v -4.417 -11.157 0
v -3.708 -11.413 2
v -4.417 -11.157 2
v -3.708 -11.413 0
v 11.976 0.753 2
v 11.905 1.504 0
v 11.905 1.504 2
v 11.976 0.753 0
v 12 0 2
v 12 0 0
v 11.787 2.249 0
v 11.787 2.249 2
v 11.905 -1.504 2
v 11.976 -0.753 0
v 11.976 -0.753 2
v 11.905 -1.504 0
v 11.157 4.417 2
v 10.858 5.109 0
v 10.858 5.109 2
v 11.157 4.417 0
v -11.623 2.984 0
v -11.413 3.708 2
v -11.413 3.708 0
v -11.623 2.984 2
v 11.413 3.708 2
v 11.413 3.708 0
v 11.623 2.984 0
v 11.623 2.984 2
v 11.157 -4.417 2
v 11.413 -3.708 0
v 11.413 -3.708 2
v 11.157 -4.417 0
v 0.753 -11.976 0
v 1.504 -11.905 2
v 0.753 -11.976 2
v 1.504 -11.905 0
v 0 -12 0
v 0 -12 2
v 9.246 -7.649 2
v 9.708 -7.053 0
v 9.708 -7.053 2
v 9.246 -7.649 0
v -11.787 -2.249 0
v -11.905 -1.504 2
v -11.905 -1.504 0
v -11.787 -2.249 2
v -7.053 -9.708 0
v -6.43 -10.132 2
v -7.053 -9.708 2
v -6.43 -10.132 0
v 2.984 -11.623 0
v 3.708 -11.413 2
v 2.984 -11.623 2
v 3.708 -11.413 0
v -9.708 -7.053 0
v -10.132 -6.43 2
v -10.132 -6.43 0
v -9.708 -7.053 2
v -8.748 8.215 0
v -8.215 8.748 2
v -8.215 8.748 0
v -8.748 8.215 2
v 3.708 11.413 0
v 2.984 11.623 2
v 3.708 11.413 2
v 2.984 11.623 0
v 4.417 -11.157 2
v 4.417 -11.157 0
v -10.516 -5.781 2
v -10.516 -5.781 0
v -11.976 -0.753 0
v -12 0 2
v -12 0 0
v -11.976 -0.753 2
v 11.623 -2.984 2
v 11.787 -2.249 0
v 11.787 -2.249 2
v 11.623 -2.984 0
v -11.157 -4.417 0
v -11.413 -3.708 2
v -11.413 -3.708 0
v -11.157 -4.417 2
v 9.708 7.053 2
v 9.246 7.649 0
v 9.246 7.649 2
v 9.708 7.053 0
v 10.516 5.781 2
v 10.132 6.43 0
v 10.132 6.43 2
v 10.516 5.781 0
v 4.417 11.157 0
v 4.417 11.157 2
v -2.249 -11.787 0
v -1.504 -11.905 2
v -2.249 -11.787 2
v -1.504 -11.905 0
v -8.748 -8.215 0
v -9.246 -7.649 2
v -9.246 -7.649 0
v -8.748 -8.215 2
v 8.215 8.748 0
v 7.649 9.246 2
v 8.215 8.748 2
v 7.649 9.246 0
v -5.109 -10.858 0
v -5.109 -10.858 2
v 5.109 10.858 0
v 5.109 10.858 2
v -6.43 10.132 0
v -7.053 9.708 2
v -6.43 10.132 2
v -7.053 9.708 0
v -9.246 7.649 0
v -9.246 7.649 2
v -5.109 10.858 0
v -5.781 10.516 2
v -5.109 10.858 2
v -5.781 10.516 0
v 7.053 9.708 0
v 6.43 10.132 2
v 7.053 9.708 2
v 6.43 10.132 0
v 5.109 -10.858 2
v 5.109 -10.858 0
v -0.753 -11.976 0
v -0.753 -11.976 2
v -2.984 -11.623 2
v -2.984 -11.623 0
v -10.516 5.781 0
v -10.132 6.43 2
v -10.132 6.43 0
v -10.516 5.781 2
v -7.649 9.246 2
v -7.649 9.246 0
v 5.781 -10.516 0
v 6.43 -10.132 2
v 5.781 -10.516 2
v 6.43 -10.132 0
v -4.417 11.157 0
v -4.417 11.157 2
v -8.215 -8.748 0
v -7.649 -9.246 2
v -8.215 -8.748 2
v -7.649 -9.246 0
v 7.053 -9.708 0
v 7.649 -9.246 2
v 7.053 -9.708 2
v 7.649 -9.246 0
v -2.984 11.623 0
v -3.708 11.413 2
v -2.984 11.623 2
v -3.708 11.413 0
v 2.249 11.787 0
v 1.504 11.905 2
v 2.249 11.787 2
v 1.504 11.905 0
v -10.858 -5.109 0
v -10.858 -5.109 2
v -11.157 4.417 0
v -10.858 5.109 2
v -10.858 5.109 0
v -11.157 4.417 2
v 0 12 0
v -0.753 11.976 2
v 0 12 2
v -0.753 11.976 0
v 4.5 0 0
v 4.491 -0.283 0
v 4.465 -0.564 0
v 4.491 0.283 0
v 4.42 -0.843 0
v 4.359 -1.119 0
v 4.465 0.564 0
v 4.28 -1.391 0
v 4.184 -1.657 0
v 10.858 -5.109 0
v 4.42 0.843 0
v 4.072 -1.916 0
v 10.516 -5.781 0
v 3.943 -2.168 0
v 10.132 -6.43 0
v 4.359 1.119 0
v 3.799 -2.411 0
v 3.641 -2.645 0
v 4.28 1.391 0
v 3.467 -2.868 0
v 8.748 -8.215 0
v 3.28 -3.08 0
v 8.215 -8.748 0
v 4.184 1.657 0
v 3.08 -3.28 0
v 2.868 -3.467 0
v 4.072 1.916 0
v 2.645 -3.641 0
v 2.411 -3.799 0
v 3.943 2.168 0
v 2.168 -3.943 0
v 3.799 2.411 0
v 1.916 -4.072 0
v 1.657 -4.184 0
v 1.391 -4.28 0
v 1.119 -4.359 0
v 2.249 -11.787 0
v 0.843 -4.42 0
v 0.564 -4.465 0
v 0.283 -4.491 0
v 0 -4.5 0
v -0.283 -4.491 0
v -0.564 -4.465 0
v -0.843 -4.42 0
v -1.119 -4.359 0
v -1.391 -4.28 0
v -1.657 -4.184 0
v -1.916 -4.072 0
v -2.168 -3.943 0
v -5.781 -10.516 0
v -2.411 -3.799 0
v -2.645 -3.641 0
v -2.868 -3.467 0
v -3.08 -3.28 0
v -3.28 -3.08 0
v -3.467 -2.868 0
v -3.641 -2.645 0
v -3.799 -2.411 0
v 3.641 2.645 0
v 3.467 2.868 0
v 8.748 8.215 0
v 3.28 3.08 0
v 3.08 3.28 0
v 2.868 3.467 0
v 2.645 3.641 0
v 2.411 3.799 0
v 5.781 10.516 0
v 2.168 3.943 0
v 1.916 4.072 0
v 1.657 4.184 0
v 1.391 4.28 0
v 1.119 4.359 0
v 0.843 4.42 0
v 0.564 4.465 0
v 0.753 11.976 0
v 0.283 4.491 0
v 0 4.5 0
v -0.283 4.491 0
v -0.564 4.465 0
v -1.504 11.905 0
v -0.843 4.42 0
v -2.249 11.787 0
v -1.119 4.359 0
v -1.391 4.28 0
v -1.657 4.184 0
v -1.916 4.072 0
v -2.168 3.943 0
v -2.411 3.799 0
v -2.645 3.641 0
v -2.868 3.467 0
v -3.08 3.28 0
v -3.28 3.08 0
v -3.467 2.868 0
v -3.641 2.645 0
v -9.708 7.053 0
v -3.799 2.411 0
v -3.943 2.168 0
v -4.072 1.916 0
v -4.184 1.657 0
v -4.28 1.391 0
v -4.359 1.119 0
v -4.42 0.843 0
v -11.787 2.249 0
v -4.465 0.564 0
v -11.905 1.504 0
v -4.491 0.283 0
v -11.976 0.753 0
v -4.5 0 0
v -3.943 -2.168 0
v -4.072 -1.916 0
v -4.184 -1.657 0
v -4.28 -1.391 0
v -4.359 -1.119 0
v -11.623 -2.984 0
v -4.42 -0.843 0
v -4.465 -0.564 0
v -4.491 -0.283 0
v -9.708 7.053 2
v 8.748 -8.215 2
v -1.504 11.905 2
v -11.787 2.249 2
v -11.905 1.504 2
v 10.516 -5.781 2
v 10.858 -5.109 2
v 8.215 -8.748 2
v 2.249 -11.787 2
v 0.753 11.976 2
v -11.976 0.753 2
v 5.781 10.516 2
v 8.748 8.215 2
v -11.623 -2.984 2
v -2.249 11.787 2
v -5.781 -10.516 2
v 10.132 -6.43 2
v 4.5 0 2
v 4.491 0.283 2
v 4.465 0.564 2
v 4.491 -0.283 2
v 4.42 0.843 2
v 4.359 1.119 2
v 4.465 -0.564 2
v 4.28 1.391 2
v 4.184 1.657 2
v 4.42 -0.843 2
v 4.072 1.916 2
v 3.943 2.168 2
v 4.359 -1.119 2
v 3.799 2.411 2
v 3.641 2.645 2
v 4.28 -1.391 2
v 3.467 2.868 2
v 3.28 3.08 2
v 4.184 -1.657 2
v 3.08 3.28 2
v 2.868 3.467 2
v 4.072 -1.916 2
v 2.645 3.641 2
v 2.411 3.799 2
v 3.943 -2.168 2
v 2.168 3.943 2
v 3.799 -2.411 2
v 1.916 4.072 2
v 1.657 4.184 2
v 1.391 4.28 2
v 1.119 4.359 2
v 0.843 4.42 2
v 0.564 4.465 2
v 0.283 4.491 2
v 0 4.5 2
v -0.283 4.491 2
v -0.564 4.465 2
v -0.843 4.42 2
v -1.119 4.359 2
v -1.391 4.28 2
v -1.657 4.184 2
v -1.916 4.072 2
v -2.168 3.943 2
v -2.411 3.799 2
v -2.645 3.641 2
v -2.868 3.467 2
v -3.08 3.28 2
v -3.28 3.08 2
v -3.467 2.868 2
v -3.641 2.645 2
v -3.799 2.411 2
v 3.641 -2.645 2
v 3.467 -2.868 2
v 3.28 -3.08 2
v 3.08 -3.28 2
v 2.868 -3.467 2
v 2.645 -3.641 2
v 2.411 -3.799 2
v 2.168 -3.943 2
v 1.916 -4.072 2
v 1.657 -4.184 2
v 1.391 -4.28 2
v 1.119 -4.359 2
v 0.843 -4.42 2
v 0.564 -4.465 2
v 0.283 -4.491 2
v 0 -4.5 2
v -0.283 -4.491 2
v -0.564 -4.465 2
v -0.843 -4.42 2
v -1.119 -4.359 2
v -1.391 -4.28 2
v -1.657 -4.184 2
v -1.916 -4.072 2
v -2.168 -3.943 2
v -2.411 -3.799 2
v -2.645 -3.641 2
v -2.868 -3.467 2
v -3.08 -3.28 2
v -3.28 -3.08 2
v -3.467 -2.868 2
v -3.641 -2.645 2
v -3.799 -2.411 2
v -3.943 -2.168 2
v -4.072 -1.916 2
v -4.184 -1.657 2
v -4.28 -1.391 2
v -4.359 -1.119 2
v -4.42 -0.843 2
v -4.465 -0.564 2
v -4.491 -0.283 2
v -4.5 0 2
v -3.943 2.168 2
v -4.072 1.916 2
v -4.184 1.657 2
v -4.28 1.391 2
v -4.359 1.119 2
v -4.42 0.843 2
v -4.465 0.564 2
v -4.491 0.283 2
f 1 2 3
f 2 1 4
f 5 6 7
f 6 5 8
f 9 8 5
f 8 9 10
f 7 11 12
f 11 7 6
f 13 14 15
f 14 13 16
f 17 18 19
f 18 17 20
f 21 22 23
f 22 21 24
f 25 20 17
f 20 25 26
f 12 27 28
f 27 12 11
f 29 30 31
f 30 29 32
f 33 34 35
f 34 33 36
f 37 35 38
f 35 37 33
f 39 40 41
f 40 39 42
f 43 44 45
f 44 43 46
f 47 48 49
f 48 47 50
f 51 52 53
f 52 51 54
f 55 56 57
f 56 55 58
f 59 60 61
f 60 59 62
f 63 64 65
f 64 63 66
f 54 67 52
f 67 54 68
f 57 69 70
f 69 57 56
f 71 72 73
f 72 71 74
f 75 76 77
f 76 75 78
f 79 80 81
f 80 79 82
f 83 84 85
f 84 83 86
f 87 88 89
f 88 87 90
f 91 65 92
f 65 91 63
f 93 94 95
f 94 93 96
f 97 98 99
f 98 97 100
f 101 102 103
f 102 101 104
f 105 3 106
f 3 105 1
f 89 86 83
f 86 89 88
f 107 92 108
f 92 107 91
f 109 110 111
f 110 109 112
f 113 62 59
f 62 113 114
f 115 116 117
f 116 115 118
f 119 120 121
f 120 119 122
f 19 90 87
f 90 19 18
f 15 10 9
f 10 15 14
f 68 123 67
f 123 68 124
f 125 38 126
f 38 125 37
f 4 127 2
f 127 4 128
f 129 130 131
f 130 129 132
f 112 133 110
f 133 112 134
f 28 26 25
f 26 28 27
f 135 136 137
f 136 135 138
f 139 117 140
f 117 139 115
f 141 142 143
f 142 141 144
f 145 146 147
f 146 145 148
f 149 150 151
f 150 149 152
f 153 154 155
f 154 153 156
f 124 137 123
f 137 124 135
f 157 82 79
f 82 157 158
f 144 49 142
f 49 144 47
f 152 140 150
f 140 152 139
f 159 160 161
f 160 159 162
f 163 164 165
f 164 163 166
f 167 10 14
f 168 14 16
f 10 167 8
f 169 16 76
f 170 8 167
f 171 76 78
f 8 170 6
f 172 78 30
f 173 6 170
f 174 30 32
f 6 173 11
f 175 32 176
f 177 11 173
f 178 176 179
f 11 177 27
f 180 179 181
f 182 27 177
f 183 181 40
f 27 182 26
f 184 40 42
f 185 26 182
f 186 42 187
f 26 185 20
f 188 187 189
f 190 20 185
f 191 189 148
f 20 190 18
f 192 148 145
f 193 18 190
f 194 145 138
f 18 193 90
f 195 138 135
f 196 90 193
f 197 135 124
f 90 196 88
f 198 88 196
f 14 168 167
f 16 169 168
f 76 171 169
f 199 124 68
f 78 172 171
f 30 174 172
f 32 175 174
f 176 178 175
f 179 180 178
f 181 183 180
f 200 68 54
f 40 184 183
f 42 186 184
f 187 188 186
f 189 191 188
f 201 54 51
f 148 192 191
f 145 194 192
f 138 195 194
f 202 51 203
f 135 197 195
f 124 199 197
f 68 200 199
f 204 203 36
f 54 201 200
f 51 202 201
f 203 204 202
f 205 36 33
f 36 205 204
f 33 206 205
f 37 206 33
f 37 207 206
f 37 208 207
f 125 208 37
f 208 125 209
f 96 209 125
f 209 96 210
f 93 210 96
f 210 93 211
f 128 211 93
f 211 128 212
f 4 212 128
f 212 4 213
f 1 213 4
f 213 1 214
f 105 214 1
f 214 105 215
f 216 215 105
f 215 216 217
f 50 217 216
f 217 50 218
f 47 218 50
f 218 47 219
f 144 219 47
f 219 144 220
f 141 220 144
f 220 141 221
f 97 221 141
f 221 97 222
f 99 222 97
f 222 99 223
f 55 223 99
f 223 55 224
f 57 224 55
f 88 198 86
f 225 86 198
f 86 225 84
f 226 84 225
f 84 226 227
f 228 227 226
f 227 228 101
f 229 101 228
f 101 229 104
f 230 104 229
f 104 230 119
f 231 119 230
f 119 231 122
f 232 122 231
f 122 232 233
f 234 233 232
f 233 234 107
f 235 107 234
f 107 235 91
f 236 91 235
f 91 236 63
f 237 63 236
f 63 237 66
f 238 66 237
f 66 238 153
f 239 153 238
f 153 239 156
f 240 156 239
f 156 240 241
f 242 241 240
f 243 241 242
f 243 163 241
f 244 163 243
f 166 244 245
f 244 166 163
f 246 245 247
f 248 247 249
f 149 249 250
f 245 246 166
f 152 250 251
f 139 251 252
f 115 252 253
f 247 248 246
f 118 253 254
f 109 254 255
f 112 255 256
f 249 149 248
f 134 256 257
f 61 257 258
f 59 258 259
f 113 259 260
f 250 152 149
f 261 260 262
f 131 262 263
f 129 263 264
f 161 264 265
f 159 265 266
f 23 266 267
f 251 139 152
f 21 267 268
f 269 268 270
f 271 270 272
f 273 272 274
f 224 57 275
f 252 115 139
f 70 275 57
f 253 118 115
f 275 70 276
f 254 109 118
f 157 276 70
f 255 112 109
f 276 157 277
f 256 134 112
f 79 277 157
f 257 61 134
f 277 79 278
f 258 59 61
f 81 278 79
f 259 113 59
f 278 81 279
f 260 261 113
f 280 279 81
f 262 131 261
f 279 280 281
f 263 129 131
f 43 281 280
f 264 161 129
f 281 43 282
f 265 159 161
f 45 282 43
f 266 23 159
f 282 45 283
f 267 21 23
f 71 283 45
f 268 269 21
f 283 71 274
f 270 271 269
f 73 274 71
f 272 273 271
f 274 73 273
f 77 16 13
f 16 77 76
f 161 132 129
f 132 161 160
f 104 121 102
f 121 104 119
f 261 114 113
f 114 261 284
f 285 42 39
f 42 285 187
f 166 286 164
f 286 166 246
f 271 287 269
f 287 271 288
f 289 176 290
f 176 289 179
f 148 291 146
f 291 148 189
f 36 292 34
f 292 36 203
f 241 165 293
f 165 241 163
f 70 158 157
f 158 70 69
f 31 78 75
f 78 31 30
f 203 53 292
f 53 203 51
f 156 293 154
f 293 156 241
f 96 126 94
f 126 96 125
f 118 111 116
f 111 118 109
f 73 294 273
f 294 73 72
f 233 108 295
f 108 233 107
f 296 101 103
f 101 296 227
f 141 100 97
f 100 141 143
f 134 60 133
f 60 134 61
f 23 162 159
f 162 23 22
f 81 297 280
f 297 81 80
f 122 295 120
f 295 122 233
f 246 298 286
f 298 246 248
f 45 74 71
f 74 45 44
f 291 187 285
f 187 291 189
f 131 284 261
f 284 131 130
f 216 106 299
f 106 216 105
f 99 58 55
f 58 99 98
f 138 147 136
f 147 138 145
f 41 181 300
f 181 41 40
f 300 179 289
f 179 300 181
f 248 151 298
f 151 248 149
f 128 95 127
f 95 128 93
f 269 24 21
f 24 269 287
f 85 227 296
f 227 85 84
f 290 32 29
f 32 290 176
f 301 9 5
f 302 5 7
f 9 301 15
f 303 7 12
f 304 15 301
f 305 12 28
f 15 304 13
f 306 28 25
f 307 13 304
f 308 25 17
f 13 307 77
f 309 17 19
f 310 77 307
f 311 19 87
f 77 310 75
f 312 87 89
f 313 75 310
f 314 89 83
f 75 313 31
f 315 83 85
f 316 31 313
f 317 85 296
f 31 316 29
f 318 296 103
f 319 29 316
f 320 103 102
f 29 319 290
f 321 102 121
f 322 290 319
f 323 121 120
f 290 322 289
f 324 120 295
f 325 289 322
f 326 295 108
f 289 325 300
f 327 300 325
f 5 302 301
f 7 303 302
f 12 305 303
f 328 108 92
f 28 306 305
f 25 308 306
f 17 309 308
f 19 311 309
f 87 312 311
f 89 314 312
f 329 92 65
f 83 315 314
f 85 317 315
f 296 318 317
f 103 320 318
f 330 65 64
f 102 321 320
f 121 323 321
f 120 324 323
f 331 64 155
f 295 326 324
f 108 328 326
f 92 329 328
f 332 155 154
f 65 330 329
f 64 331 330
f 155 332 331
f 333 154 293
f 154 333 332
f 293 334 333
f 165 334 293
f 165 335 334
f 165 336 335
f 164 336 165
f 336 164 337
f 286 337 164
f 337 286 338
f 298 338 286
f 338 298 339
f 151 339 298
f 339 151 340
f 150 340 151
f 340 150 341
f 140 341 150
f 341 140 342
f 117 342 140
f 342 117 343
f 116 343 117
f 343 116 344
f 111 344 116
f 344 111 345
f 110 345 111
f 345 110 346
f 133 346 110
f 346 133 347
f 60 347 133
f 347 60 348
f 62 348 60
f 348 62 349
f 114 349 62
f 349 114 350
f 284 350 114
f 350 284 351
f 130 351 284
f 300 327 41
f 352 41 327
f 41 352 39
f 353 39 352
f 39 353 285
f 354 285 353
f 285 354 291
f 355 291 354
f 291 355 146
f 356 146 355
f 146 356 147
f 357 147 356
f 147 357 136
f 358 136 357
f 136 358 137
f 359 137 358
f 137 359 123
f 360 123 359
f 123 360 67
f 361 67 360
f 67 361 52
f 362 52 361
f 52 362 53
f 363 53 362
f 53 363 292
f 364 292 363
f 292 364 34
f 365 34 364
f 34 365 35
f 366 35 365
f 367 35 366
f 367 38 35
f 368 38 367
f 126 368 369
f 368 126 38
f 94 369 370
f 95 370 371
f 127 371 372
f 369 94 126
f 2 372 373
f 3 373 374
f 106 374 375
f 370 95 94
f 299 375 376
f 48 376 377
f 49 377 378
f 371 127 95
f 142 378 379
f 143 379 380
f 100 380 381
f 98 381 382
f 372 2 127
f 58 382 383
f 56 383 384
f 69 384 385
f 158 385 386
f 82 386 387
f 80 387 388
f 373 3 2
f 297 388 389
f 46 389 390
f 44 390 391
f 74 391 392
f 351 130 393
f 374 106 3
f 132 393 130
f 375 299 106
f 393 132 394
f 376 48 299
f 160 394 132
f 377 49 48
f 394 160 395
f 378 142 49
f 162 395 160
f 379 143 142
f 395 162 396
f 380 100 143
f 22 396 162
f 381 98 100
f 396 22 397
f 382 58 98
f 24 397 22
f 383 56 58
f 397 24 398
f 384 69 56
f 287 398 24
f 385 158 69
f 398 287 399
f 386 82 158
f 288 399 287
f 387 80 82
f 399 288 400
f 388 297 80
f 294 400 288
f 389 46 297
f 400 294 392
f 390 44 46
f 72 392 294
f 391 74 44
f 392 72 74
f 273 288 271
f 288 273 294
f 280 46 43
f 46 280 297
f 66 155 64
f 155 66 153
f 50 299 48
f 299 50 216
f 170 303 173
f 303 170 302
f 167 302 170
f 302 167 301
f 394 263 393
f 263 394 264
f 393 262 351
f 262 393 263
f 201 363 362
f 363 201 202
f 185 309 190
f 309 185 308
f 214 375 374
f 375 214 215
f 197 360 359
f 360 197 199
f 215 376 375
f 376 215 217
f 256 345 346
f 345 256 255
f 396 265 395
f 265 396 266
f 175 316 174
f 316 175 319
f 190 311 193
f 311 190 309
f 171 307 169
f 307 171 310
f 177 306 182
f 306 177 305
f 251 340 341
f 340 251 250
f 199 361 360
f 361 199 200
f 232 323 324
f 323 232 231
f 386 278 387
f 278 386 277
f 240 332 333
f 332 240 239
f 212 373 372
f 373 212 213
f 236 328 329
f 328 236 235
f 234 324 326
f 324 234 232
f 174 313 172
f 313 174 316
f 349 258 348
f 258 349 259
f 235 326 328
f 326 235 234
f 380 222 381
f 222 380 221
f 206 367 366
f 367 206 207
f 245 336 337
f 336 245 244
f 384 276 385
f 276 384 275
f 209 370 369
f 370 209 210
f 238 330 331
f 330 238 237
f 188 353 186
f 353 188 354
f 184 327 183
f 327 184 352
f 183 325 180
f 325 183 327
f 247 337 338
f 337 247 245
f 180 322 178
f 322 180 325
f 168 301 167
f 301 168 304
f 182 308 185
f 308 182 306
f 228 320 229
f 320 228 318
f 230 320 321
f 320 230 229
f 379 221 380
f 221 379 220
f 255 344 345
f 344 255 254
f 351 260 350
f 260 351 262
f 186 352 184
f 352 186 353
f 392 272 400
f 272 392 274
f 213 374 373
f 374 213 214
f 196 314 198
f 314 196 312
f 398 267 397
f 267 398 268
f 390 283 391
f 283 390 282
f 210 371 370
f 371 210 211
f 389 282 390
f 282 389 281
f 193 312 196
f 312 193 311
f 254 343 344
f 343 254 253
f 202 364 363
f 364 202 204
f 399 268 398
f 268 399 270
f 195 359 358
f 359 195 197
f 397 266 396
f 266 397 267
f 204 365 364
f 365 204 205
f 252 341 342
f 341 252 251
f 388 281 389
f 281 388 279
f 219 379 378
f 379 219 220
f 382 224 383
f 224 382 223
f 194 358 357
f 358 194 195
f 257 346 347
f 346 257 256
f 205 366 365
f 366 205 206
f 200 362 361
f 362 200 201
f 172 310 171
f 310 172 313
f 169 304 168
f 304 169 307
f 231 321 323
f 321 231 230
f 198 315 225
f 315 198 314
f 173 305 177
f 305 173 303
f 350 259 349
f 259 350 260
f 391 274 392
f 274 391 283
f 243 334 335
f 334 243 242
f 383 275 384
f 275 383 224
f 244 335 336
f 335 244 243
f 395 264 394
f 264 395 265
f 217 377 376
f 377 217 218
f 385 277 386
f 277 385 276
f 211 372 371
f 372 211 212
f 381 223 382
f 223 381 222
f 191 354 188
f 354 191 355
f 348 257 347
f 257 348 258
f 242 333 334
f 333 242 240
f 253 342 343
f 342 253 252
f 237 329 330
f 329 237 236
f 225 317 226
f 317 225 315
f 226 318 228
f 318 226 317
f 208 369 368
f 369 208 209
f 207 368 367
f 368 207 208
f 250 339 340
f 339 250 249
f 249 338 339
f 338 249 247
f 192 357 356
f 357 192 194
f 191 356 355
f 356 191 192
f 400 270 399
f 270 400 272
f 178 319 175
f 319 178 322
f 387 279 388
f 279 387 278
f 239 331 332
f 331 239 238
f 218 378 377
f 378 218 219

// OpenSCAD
/* 'Nut Job' nut, bolt, washer and threaded rod factory by Mike Thompson 1/12/2013, Thingiverse: mike_linus
 *
 * Licensing: This work is licensed under a Creative Commons Attribution-NonCommercial-ShareAlike 3.0 Australia License.
 * Further information is available here - http://creativecommons.org/licenses/by-nc-sa/3.0/au/deed.en_GB
 *
 * v2 8/12/2013 - added socket head types
 * v3 2/11/2014 - adjusted wing nut algorithm for better behaviour with unusual nut sizes and added ISO262 metric references
 * v4 31/12/2014 - added optional texture to socket heads, added ability to change the number of facets for a hex head
 * and adjusted wingnut base level on certain nut sizes
 * v5 11/1/2015 - added phillips and slot drive types and improved texture handling 
 * v6 21/2/2015 - added wing ratio to wingnuts 
 * v7 6/3/2016 - added extended options to control number of facets on nuts, square sockets (or any number of facets) and socket depth control
 * v8 1/1/2017 - modified library code to remove dependence on deprecated 'assign' statement
 * 
 * This script generates nuts, bolts, washers and threaded rod using the library 
 * script: polyScrewThead.scad (modified/updated version polyScrewThread_r1.scad)
 * http://www.thingiverse.com/thing:8796, CC Public Domain
 *
 * Defaults are for a 8mm diameter bolts, rod, matching nuts and wing nuts that work well together
 * without cleanup or modification. Some default parameters such as the nut outer diameter are deliberately
 * altered to produce a snug fit that can still be hand tightened. This may need to be altered
 * depending on individual printer variances, slicing tools, filament etc. Suggest printing a matching
 * bolt and nut and adjusting as necessary.  Note: slow print speeds, low temperatures and solid
 * fill are recommended for best results.
 */

/* [Component Type] */

type						    = "washer";//[nut,bolt,rod,washer]

/* [Bolt and Rod Options] */

//Head type - Hex, Socket Cap, Button Socket Cap or Countersunk Socket Cap (ignored for Rod)
head_type              			= "hex";//[hex,socket,button,countersunk]
//Drive type - Socket, Phillips, Slot (ignored for Hex head type and Rod)
drive_type              		= "socket";//[socket,phillips,slot]
//Distance between flats for the hex head or diameter for socket or button head (ignored for Rod)
head_diameter    				= 20;	
//Height of the head (ignored for Rod)
head_height  					= 8;	
//Diameter of drive type (ignored for Hex head and Rod)
drive_diameter					= 5;	
//Width of slot aperture for phillips or slot drive types
slot_width					    = 1;
//Depth of slot aperture for slot drive type
slot_depth 					    = 5;
//Surface texture (socket head only)
texture                         = "exclude";//[include,exclude]
//Outer diameter of the thread
thread_outer_diameter           = 8;		
//Thread step or Pitch (2mm works well for most applications ref. ISO262: M3=0.5,M4=0.7,M5=0.8,M6=1,M8=1.25,M10=1.5)
thread_step    					= 2;
//Step shape degrees (45 degrees is optimised for most printers ref. ISO262: 30 degrees)
step_shape_degrees 				= 45;	
//Length of the threaded section
thread_length  					= 30;	
//Countersink in both ends
countersink  					= 2;	
//Length of the non-threaded section
non_thread_length				= 55;	
//Diameter for the non-threaded section (-1: Same as inner diameter of the thread, 0: Same as outer diameter of the thread, value: The given value)
non_thread_diameter				= 0;	

/* [Nut Options] */

//Type: Normal or WingNut
nut_type	                    = "normal";//[normal,wingnut]
//Distance between flats for the hex nut
nut_diameter    				= 12;	
//Height of the nut
nut_height	  				    = 6;	
//Outer diameter of the bolt thread to match (usually set about 1mm larger than bolt diameter to allow easy fit - adjust to personal preferences) 
nut_thread_outer_diameter     	= 8.8;		
//Thread step or Pitch (2mm works well for most applications ref. ISO262: M3=0.5,M4=0.7,M5=0.8,M6=1,M8=1.25,M10=1.5)
nut_thread_step    				= 2;
//Step shape degrees (45 degrees is optimised for most printers ref. ISO262: 30 degrees)
nut_step_shape_degrees 			= 45;	
//Wing radius ratio.  The proportional radius of the wing on the wing nut compared to the nut height value (default = 1)
wing_ratio                      = 1;
wing_radius=wing_ratio * nut_height;

/* [Washer Options] */

//Inner Diameter (suggest making diameter slightly larger than bolt diameter)
inner_diameter					= 9;
//Outer Diameter
outer_diameter					= 24;
//Thickness
thickness					    = 2;

/* [Extended Options] */

//Number of facets for hex head type or nut. Default is 6 for standard hex head and nut
facets                          = 6;
//Number of facets for hole in socket head. Default is 6 for standard hex socket
socket_facets                   = 6;
//Depth of hole in socket head. Default is 3.5
socket_depth                    = 3.5;
//Resolution (lower values for higher resolution, but may slow rendering)
resolution    					= 0.95;	
nut_resolution    				= resolution;

//Hex Bolt
if (type=="bolt" && head_type=="hex")
{
	hex_screw(thread_outer_diameter,thread_step,step_shape_degrees,thread_length,resolution,countersink,head_diameter,head_height,non_thread_length,non_thread_diameter);
}

//Rod
if (type=="rod")
{
	hex_screw(thread_outer_diameter,thread_step,step_shape_degrees,thread_length,resolution,countersink,head_diameter,0,non_thread_length,non_thread_diameter);
}

//Hex Nut (normally slightly larger outer diameter to fit on bolt correctly)
if (type=="nut" && nut_type=="normal")
{
	hex_nut(nut_diameter,nut_height,nut_thread_step,nut_step_shape_degrees,nut_thread_outer_diameter,nut_resolution);
}

//Wing Nut variation of hex nut. Cylinders added to each side of nut for easy turning - ideal for quick release applications
if (type=="nut" && nut_type=="wingnut")
{
	rotate([0,0,30])hex_nut(nut_diameter,nut_height,nut_thread_step,nut_step_shape_degrees,nut_thread_outer_diameter,nut_resolution); //nut	
	translate([(nut_diameter/2)+wing_radius-1,1.5,wing_radius/2+1])rotate([90,0,0])wing(); //attach wing
	mirror(1,0,0)translate([(nut_diameter/2)+wing_radius-1,1.5,wing_radius/2+1])rotate([90,0,0])wing(); //attach wing
}

module wing()
{
	difference()
	{
		cylinder(r=wing_radius,h=3,$fn=64); //cylinder
		union()
		{
			translate([-wing_radius,-wing_radius-1,-0.5])cube([wing_radius*2,wing_radius/2,wing_radius*2]); //remove overhang so flush with base of nut		
			rotate([0,0,90])translate([-wing_radius,wing_radius-1,-0.5])cube([wing_radius*2,wing_radius/2,wing_radius*2]); //remove overhangs so flush with side of nut		
		}
	}
}

//Washer
if (type=="washer")
{
	difference()
	{
		cylinder(r=outer_diameter/2,h=thickness,$fn=100);
		translate([0,0,-0.1])cylinder(r=inner_diameter/2,h=thickness+0.2,$fn=100);
	}
}

//Socket Head Bolt
if (type=="bolt" && head_type!="hex")
{
	socket_screw(thread_outer_diameter,thread_step,step_shape_degrees,thread_length,resolution,countersink,head_diameter,head_height,non_thread_length,non_thread_diameter);
}

module phillips_base()
{
	linear_extrude(slot_width)polygon(points=[[0,0],[(drive_diameter-slot_width)/2,9/5*(drive_diameter-slot_width)/2],[(drive_diameter+slot_width)/2,9/5*(drive_diameter-slot_width)/2],[drive_diameter,0]]);
	translate([(drive_diameter-slot_width)/2,0,(drive_diameter+slot_width)/2])rotate([0,90,0])linear_extrude(slot_width)polygon(points=[[0,0],[(drive_diameter-slot_width)/2,9/5*(drive_diameter-slot_width)/2],[(drive_diameter+slot_width)/2,9/5*(drive_diameter-slot_width)/2],[drive_diameter,0]]);
}

module phillips_fillet()
{
	union()
	{
		translate([-(drive_diameter-slot_width)/2-(slot_width/2),slot_width/2,0])rotate([90,0,0])phillips_base();
		translate([0,0,9/5*(drive_diameter-slot_width)/2])union()
		{
			inner_curve();
			rotate([0,0,90])inner_curve();
			rotate([0,0,180])inner_curve();
			rotate([0,0,270])inner_curve();
		}
	}
}

module inner_curve()
{
	translate([slot_width/2,-slot_width/2,0])rotate([0,90,0])linear_fillet(9/5*(drive_diameter-slot_width)/2,drive_diameter/10);
}

//basic 2d profile used for fillet shape
module profile(radius)
{
  difference()
  {
    square(radius);
    circle(r=radius);
  }
}

//linear fillet for use along straight edges
module linear_fillet(length,profile_radius)
{
	translate([0,-profile_radius,profile_radius])rotate([0,90,0])linear_extrude(height=length,convexity=10)profile(profile_radius);
}

module phillips_drive()
{
	intersection()
	{
		phillips_fillet();
		cylinder(9/5*(drive_diameter-slot_width)/2,drive_diameter/2+(slot_width/2),slot_width/2);
	}
}

module socket_screw(od,st,lf0,lt,rs,cs,df,hg,ntl,ntd)
{
    ntr=od/2-(st/2)*cos(lf0)/sin(lf0);
	$fn=60;

	difference()
	{
    		union()
    		{
        		if (head_type=="socket")
				{
					socket_head(hg,df);
				}
			
        		if (head_type=="button")
				{
					button_head(hg,df);				
				}

        		if (head_type=="countersunk")
				{
					countersunk_head(hg,df);				
				}

        		translate([0,0,hg])
        		if ( ntl == 0 )
        		{
          		cylinder(h=0.01, r=ntr, center=true);
        		}
        		else
        		{
            		if ( ntd == -1 )
            		{
                		cylinder(h=ntl+0.01, r=ntr, $fn=floor(od*PI/rs), center=false);
            		}
            		else if ( ntd == 0 )
            		{
                		union()
                		{
                    		cylinder(h=ntl-st/2,r=od/2, $fn=floor(od*PI/rs), center=false);
                    		translate([0,0,ntl-st/2])
                    		cylinder(h=st/2,
                             r1=od/2, r2=ntr, 
                             $fn=floor(od*PI/rs), center=false);
                		}
            		}
            		else
            		{
                		cylinder(h=ntl, r=ntd/2, $fn=ntd*PI/rs, center=false);
            		}
        		}
        		translate([0,0,ntl+hg]) screw_thread(od,st,lf0,lt,rs,cs);
    		}
		//create opening for specific drive type
		if (drive_type=="socket")
		{
			cylinder(r=drive_diameter/2,h=socket_depth,$fn=socket_facets); //socket
			#translate([0,0,socket_depth])cylinder(r1=drive_diameter/2,r2=0,h=drive_diameter/3,$fn=socket_facets); //socket tapers at base to allow printing without bridging and improve socket grip
		}
		else
		{
			if (drive_type=="phillips")
			{
				translate([0,0,-0.001])phillips_drive();
			}
			else //slot
			{
				translate([-(drive_diameter)/2,slot_width/2,-0.001])rotate([90,0,0])cube([drive_diameter,slot_depth,slot_width]);
			}	
		}
	}
}

module socket_head(hg,df)
{
	texture_points=2*PI*(head_diameter/2);
	texture_offset=head_diameter/18;
	texture_radius=head_diameter/24;

	rd0=df/2/sin(60);
	x0=0;	x1=df/2;	x2=x1+hg/2;
	y0=0;	y1=hg/2;	y2=hg;

	intersection()
	{
	   	cylinder(h=hg, r=rd0, $fn=60, center=false);
		rotate_extrude(convexity=10, $fn=6*round(df*PI/6/0.5))
		polygon([ [x0,y0],[x1,y0],[x2,y1],[x1,y2],[x0,y2] ]);
	}

	if (texture=="include") //add texture to socket head. Adjust texture density and size using texture variables above 
	{
		for (i= [1:texture_points])
		{
			translate([cos(360/texture_points*i)*(head_diameter/2+texture_offset), sin(360/texture_points*i)*(head_diameter/2+texture_offset), 1 ])
			rotate([0,0,360/texture_points*i])cylinder(r=texture_radius,h=head_height*0.6,$fn=3);
		}
	}

}

module button_head(hg,df)
{
	rd0=df/2/sin(60);
	x0=0;	x1=df/2;	x2=x1+hg/2;
	y0=0;	y1=hg/2;	y2=hg;

	intersection()
	{
	   	cylinder(h=hg, r1=drive_diameter/2 + 1, r2=rd0, $fn=60, center=false);
		rotate_extrude(convexity=10, $fn=6*round(df*PI/6/0.5))
		polygon([ [x0,y0],[x1,y0],[x2,y1],[x1,y2],[x0,y2] ]);
	}
}

module countersunk_head(hg,df)
{
	rd0=df/2/sin(60);
	x0=0;	x1=df/2;	x2=x1+hg/2;
	y0=0;	y1=hg/2;	y2=hg;

	intersection()
	{
	   cylinder(h=hg, r1=rd0, r2=thread_outer_diameter/2-0.5, $fn=60, center=false);

		rotate_extrude(convexity=10, $fn=6*round(df*PI/6/0.5))
		polygon([ [x0,y0],[x1,y0],[x2,y1],[x1,y2],[x0,y2] ]);
	}
}

/* Library included below to allow customizer functionality    
 *   
 * polyScrewThread_r1.scad    by aubenc @ Thingiverse
 *
 * Modified by mike_mattala @ Thingiverse 1/1/2017 to remove deprecated assign
 * 
 * This script contains the library modules that can be used to generate
 * threaded rods, screws and nuts.
 *
 * http://www.thingiverse.com/thing:8796
 *
 * CC Public Domain
 */

module screw_thread(od,st,lf0,lt,rs,cs)
{
    or=od/2;
    ir=or-st/2*cos(lf0)/sin(lf0);
    pf=2*PI*or;
    sn=floor(pf/rs);
    lfxy=360/sn;
    ttn=round(lt/st+1);
    zt=st/sn;

    intersection()
    {
        if (cs >= -1)
        {
           thread_shape(cs,lt,or,ir,sn,st);
        }

        full_thread(ttn,st,sn,zt,lfxy,or,ir);
    }
}

module hex_nut(df,hg,sth,clf,cod,crs)
{

    difference()
    {
        hex_head(hg,df);

        hex_countersink_ends(sth/2,cod,clf,crs,hg);

        screw_thread(cod,sth,clf,hg,crs,-2);
    }
}


module hex_screw(od,st,lf0,lt,rs,cs,df,hg,ntl,ntd)
{
    ntr=od/2-(st/2)*cos(lf0)/sin(lf0);

    union()
    {
        hex_head(hg,df);

        translate([0,0,hg])
        if ( ntl == 0 )
        {
            cylinder(h=0.01, r=ntr, center=true);
        }
        else
        {
            if ( ntd == -1 )
            {
                cylinder(h=ntl+0.01, r=ntr, $fn=floor(od*PI/rs), center=false);
            }
            else if ( ntd == 0 )
            {
                union()
                {
                    cylinder(h=ntl-st/2,
                             r=od/2, $fn=floor(od*PI/rs), center=false);

                    translate([0,0,ntl-st/2])
                    cylinder(h=st/2,
                             r1=od/2, r2=ntr, 
                             $fn=floor(od*PI/rs), center=false);
                }
            }
            else
            {
                cylinder(h=ntl, r=ntd/2, $fn=ntd*PI/rs, center=false);
            }
        }

        translate([0,0,ntl+hg]) screw_thread(od,st,lf0,lt,rs,cs);
    }
}

module hex_screw_0(od,st,lf0,lt,rs,cs,df,hg,ntl,ntd)
{
    ntr=od/2-(st/2)*cos(lf0)/sin(lf0);

    union()
    {
        hex_head_0(hg,df);

        translate([0,0,hg])
        if ( ntl == 0 )
        {
            cylinder(h=0.01, r=ntr, center=true);
        }
        else
        {
            if ( ntd == -1 )
            {
                cylinder(h=ntl+0.01, r=ntr, $fn=floor(od*PI/rs), center=false);
            }
            else if ( ntd == 0 )
            {
                union()
                {
                    cylinder(h=ntl-st/2,
                             r=od/2, $fn=floor(od*PI/rs), center=false);

                    translate([0,0,ntl-st/2])
                    cylinder(h=st/2,
                             r1=od/2, r2=ntr, 
                             $fn=floor(od*PI/rs), center=false);
                }
            }
            else
            {
                cylinder(h=ntl, r=ntd/2, $fn=ntd*PI/rs, center=false);
            }
        }

        translate([0,0,ntl+hg]) screw_thread(od,st,lf0,lt,rs,cs);
    }
}

module thread_shape(cs,lt,or,ir,sn,st)
{
    if ( cs == 0 )
    {
        cylinder(h=lt, r=or, $fn=sn, center=false);
    }
    else
    {
        union()
        {
            translate([0,0,st/2])
              cylinder(h=lt-st+0.005, r=or, $fn=sn, center=false);

            if ( cs == -1 || cs == 2 )
            {
                cylinder(h=st/2, r1=ir, r2=or, $fn=sn, center=false);
            }
            else
            {
                cylinder(h=st/2, r=or, $fn=sn, center=false);
            }

            translate([0,0,lt-st/2])
            if ( cs == 1 || cs == 2 )
            {
                  cylinder(h=st/2, r1=or, r2=ir, $fn=sn, center=false);
            }
            else
            {
                cylinder(h=st/2, r=or, $fn=sn, center=false);
            }
        }
    }
}

module full_thread(ttn,st,sn,zt,lfxy,or,ir)
{
  if(ir >= 0.2)
  {
    for(i=[0:ttn-1])
    {
        for(j=[0:sn-1])
        {
			pt = [[0,0,i*st-st],
                 [ir*cos(j*lfxy),     ir*sin(j*lfxy),     i*st+j*zt-st       ],
                 [ir*cos((j+1)*lfxy), ir*sin((j+1)*lfxy), i*st+(j+1)*zt-st   ],
				 [0,0,i*st],
                 [or*cos(j*lfxy),     or*sin(j*lfxy),     i*st+j*zt-st/2     ],
                 [or*cos((j+1)*lfxy), or*sin((j+1)*lfxy), i*st+(j+1)*zt-st/2 ],
                 [ir*cos(j*lfxy),     ir*sin(j*lfxy),     i*st+j*zt          ],
                 [ir*cos((j+1)*lfxy), ir*sin((j+1)*lfxy), i*st+(j+1)*zt      ],
                 [0,0,i*st+st]];
               
            polyhedron(points=pt,faces=[[1,0,3],[1,3,6],[6,3,8],[1,6,4], //changed triangles to faces (to be deprecated)
										[0,1,2],[1,4,2],[2,4,5],[5,4,6],[5,6,7],[7,6,8],
										[7,8,3],[0,2,3],[3,2,7],[7,2,5]	]);
        }
    }
  }
  else
  {
    echo("Step Degrees too agresive, the thread will not be made!!");
    echo("Try to increase de value for the degrees and/or...");
    echo(" decrease the pitch value and/or...");
    echo(" increase the outer diameter value.");
  }
}

module hex_head(hg,df)
{
	rd0=df/2/sin(60);
	x0=0;	x1=df/2;	x2=x1+hg/2;
	y0=0;	y1=hg/2;	y2=hg;

	intersection()
	{
	   cylinder(h=hg, r=rd0, $fn=facets, center=false);

		rotate_extrude(convexity=10, $fn=6*round(df*PI/6/0.5))
		polygon([ [x0,y0],[x1,y0],[x2,y1],[x1,y2],[x0,y2] ]);
	}
}

module hex_head_0(hg,df)
{
    cylinder(h=hg, r=df/2/sin(60), $fn=6, center=false);
}

module hex_countersink_ends(chg,cod,clf,crs,hg)
{
    translate([0,0,-0.1])
    cylinder(h=chg+0.01, 
             r1=cod/2, 
             r2=cod/2-(chg+0.1)*cos(clf)/sin(clf),
             $fn=floor(cod*PI/crs), center=false);

    translate([0,0,hg-chg+0.1])
    cylinder(h=chg+0.01, 
             r1=cod/2-(chg+0.1)*cos(clf)/sin(clf),
             r2=cod/2, 
             $fn=floor(cod*PI/crs), center=false);
}
